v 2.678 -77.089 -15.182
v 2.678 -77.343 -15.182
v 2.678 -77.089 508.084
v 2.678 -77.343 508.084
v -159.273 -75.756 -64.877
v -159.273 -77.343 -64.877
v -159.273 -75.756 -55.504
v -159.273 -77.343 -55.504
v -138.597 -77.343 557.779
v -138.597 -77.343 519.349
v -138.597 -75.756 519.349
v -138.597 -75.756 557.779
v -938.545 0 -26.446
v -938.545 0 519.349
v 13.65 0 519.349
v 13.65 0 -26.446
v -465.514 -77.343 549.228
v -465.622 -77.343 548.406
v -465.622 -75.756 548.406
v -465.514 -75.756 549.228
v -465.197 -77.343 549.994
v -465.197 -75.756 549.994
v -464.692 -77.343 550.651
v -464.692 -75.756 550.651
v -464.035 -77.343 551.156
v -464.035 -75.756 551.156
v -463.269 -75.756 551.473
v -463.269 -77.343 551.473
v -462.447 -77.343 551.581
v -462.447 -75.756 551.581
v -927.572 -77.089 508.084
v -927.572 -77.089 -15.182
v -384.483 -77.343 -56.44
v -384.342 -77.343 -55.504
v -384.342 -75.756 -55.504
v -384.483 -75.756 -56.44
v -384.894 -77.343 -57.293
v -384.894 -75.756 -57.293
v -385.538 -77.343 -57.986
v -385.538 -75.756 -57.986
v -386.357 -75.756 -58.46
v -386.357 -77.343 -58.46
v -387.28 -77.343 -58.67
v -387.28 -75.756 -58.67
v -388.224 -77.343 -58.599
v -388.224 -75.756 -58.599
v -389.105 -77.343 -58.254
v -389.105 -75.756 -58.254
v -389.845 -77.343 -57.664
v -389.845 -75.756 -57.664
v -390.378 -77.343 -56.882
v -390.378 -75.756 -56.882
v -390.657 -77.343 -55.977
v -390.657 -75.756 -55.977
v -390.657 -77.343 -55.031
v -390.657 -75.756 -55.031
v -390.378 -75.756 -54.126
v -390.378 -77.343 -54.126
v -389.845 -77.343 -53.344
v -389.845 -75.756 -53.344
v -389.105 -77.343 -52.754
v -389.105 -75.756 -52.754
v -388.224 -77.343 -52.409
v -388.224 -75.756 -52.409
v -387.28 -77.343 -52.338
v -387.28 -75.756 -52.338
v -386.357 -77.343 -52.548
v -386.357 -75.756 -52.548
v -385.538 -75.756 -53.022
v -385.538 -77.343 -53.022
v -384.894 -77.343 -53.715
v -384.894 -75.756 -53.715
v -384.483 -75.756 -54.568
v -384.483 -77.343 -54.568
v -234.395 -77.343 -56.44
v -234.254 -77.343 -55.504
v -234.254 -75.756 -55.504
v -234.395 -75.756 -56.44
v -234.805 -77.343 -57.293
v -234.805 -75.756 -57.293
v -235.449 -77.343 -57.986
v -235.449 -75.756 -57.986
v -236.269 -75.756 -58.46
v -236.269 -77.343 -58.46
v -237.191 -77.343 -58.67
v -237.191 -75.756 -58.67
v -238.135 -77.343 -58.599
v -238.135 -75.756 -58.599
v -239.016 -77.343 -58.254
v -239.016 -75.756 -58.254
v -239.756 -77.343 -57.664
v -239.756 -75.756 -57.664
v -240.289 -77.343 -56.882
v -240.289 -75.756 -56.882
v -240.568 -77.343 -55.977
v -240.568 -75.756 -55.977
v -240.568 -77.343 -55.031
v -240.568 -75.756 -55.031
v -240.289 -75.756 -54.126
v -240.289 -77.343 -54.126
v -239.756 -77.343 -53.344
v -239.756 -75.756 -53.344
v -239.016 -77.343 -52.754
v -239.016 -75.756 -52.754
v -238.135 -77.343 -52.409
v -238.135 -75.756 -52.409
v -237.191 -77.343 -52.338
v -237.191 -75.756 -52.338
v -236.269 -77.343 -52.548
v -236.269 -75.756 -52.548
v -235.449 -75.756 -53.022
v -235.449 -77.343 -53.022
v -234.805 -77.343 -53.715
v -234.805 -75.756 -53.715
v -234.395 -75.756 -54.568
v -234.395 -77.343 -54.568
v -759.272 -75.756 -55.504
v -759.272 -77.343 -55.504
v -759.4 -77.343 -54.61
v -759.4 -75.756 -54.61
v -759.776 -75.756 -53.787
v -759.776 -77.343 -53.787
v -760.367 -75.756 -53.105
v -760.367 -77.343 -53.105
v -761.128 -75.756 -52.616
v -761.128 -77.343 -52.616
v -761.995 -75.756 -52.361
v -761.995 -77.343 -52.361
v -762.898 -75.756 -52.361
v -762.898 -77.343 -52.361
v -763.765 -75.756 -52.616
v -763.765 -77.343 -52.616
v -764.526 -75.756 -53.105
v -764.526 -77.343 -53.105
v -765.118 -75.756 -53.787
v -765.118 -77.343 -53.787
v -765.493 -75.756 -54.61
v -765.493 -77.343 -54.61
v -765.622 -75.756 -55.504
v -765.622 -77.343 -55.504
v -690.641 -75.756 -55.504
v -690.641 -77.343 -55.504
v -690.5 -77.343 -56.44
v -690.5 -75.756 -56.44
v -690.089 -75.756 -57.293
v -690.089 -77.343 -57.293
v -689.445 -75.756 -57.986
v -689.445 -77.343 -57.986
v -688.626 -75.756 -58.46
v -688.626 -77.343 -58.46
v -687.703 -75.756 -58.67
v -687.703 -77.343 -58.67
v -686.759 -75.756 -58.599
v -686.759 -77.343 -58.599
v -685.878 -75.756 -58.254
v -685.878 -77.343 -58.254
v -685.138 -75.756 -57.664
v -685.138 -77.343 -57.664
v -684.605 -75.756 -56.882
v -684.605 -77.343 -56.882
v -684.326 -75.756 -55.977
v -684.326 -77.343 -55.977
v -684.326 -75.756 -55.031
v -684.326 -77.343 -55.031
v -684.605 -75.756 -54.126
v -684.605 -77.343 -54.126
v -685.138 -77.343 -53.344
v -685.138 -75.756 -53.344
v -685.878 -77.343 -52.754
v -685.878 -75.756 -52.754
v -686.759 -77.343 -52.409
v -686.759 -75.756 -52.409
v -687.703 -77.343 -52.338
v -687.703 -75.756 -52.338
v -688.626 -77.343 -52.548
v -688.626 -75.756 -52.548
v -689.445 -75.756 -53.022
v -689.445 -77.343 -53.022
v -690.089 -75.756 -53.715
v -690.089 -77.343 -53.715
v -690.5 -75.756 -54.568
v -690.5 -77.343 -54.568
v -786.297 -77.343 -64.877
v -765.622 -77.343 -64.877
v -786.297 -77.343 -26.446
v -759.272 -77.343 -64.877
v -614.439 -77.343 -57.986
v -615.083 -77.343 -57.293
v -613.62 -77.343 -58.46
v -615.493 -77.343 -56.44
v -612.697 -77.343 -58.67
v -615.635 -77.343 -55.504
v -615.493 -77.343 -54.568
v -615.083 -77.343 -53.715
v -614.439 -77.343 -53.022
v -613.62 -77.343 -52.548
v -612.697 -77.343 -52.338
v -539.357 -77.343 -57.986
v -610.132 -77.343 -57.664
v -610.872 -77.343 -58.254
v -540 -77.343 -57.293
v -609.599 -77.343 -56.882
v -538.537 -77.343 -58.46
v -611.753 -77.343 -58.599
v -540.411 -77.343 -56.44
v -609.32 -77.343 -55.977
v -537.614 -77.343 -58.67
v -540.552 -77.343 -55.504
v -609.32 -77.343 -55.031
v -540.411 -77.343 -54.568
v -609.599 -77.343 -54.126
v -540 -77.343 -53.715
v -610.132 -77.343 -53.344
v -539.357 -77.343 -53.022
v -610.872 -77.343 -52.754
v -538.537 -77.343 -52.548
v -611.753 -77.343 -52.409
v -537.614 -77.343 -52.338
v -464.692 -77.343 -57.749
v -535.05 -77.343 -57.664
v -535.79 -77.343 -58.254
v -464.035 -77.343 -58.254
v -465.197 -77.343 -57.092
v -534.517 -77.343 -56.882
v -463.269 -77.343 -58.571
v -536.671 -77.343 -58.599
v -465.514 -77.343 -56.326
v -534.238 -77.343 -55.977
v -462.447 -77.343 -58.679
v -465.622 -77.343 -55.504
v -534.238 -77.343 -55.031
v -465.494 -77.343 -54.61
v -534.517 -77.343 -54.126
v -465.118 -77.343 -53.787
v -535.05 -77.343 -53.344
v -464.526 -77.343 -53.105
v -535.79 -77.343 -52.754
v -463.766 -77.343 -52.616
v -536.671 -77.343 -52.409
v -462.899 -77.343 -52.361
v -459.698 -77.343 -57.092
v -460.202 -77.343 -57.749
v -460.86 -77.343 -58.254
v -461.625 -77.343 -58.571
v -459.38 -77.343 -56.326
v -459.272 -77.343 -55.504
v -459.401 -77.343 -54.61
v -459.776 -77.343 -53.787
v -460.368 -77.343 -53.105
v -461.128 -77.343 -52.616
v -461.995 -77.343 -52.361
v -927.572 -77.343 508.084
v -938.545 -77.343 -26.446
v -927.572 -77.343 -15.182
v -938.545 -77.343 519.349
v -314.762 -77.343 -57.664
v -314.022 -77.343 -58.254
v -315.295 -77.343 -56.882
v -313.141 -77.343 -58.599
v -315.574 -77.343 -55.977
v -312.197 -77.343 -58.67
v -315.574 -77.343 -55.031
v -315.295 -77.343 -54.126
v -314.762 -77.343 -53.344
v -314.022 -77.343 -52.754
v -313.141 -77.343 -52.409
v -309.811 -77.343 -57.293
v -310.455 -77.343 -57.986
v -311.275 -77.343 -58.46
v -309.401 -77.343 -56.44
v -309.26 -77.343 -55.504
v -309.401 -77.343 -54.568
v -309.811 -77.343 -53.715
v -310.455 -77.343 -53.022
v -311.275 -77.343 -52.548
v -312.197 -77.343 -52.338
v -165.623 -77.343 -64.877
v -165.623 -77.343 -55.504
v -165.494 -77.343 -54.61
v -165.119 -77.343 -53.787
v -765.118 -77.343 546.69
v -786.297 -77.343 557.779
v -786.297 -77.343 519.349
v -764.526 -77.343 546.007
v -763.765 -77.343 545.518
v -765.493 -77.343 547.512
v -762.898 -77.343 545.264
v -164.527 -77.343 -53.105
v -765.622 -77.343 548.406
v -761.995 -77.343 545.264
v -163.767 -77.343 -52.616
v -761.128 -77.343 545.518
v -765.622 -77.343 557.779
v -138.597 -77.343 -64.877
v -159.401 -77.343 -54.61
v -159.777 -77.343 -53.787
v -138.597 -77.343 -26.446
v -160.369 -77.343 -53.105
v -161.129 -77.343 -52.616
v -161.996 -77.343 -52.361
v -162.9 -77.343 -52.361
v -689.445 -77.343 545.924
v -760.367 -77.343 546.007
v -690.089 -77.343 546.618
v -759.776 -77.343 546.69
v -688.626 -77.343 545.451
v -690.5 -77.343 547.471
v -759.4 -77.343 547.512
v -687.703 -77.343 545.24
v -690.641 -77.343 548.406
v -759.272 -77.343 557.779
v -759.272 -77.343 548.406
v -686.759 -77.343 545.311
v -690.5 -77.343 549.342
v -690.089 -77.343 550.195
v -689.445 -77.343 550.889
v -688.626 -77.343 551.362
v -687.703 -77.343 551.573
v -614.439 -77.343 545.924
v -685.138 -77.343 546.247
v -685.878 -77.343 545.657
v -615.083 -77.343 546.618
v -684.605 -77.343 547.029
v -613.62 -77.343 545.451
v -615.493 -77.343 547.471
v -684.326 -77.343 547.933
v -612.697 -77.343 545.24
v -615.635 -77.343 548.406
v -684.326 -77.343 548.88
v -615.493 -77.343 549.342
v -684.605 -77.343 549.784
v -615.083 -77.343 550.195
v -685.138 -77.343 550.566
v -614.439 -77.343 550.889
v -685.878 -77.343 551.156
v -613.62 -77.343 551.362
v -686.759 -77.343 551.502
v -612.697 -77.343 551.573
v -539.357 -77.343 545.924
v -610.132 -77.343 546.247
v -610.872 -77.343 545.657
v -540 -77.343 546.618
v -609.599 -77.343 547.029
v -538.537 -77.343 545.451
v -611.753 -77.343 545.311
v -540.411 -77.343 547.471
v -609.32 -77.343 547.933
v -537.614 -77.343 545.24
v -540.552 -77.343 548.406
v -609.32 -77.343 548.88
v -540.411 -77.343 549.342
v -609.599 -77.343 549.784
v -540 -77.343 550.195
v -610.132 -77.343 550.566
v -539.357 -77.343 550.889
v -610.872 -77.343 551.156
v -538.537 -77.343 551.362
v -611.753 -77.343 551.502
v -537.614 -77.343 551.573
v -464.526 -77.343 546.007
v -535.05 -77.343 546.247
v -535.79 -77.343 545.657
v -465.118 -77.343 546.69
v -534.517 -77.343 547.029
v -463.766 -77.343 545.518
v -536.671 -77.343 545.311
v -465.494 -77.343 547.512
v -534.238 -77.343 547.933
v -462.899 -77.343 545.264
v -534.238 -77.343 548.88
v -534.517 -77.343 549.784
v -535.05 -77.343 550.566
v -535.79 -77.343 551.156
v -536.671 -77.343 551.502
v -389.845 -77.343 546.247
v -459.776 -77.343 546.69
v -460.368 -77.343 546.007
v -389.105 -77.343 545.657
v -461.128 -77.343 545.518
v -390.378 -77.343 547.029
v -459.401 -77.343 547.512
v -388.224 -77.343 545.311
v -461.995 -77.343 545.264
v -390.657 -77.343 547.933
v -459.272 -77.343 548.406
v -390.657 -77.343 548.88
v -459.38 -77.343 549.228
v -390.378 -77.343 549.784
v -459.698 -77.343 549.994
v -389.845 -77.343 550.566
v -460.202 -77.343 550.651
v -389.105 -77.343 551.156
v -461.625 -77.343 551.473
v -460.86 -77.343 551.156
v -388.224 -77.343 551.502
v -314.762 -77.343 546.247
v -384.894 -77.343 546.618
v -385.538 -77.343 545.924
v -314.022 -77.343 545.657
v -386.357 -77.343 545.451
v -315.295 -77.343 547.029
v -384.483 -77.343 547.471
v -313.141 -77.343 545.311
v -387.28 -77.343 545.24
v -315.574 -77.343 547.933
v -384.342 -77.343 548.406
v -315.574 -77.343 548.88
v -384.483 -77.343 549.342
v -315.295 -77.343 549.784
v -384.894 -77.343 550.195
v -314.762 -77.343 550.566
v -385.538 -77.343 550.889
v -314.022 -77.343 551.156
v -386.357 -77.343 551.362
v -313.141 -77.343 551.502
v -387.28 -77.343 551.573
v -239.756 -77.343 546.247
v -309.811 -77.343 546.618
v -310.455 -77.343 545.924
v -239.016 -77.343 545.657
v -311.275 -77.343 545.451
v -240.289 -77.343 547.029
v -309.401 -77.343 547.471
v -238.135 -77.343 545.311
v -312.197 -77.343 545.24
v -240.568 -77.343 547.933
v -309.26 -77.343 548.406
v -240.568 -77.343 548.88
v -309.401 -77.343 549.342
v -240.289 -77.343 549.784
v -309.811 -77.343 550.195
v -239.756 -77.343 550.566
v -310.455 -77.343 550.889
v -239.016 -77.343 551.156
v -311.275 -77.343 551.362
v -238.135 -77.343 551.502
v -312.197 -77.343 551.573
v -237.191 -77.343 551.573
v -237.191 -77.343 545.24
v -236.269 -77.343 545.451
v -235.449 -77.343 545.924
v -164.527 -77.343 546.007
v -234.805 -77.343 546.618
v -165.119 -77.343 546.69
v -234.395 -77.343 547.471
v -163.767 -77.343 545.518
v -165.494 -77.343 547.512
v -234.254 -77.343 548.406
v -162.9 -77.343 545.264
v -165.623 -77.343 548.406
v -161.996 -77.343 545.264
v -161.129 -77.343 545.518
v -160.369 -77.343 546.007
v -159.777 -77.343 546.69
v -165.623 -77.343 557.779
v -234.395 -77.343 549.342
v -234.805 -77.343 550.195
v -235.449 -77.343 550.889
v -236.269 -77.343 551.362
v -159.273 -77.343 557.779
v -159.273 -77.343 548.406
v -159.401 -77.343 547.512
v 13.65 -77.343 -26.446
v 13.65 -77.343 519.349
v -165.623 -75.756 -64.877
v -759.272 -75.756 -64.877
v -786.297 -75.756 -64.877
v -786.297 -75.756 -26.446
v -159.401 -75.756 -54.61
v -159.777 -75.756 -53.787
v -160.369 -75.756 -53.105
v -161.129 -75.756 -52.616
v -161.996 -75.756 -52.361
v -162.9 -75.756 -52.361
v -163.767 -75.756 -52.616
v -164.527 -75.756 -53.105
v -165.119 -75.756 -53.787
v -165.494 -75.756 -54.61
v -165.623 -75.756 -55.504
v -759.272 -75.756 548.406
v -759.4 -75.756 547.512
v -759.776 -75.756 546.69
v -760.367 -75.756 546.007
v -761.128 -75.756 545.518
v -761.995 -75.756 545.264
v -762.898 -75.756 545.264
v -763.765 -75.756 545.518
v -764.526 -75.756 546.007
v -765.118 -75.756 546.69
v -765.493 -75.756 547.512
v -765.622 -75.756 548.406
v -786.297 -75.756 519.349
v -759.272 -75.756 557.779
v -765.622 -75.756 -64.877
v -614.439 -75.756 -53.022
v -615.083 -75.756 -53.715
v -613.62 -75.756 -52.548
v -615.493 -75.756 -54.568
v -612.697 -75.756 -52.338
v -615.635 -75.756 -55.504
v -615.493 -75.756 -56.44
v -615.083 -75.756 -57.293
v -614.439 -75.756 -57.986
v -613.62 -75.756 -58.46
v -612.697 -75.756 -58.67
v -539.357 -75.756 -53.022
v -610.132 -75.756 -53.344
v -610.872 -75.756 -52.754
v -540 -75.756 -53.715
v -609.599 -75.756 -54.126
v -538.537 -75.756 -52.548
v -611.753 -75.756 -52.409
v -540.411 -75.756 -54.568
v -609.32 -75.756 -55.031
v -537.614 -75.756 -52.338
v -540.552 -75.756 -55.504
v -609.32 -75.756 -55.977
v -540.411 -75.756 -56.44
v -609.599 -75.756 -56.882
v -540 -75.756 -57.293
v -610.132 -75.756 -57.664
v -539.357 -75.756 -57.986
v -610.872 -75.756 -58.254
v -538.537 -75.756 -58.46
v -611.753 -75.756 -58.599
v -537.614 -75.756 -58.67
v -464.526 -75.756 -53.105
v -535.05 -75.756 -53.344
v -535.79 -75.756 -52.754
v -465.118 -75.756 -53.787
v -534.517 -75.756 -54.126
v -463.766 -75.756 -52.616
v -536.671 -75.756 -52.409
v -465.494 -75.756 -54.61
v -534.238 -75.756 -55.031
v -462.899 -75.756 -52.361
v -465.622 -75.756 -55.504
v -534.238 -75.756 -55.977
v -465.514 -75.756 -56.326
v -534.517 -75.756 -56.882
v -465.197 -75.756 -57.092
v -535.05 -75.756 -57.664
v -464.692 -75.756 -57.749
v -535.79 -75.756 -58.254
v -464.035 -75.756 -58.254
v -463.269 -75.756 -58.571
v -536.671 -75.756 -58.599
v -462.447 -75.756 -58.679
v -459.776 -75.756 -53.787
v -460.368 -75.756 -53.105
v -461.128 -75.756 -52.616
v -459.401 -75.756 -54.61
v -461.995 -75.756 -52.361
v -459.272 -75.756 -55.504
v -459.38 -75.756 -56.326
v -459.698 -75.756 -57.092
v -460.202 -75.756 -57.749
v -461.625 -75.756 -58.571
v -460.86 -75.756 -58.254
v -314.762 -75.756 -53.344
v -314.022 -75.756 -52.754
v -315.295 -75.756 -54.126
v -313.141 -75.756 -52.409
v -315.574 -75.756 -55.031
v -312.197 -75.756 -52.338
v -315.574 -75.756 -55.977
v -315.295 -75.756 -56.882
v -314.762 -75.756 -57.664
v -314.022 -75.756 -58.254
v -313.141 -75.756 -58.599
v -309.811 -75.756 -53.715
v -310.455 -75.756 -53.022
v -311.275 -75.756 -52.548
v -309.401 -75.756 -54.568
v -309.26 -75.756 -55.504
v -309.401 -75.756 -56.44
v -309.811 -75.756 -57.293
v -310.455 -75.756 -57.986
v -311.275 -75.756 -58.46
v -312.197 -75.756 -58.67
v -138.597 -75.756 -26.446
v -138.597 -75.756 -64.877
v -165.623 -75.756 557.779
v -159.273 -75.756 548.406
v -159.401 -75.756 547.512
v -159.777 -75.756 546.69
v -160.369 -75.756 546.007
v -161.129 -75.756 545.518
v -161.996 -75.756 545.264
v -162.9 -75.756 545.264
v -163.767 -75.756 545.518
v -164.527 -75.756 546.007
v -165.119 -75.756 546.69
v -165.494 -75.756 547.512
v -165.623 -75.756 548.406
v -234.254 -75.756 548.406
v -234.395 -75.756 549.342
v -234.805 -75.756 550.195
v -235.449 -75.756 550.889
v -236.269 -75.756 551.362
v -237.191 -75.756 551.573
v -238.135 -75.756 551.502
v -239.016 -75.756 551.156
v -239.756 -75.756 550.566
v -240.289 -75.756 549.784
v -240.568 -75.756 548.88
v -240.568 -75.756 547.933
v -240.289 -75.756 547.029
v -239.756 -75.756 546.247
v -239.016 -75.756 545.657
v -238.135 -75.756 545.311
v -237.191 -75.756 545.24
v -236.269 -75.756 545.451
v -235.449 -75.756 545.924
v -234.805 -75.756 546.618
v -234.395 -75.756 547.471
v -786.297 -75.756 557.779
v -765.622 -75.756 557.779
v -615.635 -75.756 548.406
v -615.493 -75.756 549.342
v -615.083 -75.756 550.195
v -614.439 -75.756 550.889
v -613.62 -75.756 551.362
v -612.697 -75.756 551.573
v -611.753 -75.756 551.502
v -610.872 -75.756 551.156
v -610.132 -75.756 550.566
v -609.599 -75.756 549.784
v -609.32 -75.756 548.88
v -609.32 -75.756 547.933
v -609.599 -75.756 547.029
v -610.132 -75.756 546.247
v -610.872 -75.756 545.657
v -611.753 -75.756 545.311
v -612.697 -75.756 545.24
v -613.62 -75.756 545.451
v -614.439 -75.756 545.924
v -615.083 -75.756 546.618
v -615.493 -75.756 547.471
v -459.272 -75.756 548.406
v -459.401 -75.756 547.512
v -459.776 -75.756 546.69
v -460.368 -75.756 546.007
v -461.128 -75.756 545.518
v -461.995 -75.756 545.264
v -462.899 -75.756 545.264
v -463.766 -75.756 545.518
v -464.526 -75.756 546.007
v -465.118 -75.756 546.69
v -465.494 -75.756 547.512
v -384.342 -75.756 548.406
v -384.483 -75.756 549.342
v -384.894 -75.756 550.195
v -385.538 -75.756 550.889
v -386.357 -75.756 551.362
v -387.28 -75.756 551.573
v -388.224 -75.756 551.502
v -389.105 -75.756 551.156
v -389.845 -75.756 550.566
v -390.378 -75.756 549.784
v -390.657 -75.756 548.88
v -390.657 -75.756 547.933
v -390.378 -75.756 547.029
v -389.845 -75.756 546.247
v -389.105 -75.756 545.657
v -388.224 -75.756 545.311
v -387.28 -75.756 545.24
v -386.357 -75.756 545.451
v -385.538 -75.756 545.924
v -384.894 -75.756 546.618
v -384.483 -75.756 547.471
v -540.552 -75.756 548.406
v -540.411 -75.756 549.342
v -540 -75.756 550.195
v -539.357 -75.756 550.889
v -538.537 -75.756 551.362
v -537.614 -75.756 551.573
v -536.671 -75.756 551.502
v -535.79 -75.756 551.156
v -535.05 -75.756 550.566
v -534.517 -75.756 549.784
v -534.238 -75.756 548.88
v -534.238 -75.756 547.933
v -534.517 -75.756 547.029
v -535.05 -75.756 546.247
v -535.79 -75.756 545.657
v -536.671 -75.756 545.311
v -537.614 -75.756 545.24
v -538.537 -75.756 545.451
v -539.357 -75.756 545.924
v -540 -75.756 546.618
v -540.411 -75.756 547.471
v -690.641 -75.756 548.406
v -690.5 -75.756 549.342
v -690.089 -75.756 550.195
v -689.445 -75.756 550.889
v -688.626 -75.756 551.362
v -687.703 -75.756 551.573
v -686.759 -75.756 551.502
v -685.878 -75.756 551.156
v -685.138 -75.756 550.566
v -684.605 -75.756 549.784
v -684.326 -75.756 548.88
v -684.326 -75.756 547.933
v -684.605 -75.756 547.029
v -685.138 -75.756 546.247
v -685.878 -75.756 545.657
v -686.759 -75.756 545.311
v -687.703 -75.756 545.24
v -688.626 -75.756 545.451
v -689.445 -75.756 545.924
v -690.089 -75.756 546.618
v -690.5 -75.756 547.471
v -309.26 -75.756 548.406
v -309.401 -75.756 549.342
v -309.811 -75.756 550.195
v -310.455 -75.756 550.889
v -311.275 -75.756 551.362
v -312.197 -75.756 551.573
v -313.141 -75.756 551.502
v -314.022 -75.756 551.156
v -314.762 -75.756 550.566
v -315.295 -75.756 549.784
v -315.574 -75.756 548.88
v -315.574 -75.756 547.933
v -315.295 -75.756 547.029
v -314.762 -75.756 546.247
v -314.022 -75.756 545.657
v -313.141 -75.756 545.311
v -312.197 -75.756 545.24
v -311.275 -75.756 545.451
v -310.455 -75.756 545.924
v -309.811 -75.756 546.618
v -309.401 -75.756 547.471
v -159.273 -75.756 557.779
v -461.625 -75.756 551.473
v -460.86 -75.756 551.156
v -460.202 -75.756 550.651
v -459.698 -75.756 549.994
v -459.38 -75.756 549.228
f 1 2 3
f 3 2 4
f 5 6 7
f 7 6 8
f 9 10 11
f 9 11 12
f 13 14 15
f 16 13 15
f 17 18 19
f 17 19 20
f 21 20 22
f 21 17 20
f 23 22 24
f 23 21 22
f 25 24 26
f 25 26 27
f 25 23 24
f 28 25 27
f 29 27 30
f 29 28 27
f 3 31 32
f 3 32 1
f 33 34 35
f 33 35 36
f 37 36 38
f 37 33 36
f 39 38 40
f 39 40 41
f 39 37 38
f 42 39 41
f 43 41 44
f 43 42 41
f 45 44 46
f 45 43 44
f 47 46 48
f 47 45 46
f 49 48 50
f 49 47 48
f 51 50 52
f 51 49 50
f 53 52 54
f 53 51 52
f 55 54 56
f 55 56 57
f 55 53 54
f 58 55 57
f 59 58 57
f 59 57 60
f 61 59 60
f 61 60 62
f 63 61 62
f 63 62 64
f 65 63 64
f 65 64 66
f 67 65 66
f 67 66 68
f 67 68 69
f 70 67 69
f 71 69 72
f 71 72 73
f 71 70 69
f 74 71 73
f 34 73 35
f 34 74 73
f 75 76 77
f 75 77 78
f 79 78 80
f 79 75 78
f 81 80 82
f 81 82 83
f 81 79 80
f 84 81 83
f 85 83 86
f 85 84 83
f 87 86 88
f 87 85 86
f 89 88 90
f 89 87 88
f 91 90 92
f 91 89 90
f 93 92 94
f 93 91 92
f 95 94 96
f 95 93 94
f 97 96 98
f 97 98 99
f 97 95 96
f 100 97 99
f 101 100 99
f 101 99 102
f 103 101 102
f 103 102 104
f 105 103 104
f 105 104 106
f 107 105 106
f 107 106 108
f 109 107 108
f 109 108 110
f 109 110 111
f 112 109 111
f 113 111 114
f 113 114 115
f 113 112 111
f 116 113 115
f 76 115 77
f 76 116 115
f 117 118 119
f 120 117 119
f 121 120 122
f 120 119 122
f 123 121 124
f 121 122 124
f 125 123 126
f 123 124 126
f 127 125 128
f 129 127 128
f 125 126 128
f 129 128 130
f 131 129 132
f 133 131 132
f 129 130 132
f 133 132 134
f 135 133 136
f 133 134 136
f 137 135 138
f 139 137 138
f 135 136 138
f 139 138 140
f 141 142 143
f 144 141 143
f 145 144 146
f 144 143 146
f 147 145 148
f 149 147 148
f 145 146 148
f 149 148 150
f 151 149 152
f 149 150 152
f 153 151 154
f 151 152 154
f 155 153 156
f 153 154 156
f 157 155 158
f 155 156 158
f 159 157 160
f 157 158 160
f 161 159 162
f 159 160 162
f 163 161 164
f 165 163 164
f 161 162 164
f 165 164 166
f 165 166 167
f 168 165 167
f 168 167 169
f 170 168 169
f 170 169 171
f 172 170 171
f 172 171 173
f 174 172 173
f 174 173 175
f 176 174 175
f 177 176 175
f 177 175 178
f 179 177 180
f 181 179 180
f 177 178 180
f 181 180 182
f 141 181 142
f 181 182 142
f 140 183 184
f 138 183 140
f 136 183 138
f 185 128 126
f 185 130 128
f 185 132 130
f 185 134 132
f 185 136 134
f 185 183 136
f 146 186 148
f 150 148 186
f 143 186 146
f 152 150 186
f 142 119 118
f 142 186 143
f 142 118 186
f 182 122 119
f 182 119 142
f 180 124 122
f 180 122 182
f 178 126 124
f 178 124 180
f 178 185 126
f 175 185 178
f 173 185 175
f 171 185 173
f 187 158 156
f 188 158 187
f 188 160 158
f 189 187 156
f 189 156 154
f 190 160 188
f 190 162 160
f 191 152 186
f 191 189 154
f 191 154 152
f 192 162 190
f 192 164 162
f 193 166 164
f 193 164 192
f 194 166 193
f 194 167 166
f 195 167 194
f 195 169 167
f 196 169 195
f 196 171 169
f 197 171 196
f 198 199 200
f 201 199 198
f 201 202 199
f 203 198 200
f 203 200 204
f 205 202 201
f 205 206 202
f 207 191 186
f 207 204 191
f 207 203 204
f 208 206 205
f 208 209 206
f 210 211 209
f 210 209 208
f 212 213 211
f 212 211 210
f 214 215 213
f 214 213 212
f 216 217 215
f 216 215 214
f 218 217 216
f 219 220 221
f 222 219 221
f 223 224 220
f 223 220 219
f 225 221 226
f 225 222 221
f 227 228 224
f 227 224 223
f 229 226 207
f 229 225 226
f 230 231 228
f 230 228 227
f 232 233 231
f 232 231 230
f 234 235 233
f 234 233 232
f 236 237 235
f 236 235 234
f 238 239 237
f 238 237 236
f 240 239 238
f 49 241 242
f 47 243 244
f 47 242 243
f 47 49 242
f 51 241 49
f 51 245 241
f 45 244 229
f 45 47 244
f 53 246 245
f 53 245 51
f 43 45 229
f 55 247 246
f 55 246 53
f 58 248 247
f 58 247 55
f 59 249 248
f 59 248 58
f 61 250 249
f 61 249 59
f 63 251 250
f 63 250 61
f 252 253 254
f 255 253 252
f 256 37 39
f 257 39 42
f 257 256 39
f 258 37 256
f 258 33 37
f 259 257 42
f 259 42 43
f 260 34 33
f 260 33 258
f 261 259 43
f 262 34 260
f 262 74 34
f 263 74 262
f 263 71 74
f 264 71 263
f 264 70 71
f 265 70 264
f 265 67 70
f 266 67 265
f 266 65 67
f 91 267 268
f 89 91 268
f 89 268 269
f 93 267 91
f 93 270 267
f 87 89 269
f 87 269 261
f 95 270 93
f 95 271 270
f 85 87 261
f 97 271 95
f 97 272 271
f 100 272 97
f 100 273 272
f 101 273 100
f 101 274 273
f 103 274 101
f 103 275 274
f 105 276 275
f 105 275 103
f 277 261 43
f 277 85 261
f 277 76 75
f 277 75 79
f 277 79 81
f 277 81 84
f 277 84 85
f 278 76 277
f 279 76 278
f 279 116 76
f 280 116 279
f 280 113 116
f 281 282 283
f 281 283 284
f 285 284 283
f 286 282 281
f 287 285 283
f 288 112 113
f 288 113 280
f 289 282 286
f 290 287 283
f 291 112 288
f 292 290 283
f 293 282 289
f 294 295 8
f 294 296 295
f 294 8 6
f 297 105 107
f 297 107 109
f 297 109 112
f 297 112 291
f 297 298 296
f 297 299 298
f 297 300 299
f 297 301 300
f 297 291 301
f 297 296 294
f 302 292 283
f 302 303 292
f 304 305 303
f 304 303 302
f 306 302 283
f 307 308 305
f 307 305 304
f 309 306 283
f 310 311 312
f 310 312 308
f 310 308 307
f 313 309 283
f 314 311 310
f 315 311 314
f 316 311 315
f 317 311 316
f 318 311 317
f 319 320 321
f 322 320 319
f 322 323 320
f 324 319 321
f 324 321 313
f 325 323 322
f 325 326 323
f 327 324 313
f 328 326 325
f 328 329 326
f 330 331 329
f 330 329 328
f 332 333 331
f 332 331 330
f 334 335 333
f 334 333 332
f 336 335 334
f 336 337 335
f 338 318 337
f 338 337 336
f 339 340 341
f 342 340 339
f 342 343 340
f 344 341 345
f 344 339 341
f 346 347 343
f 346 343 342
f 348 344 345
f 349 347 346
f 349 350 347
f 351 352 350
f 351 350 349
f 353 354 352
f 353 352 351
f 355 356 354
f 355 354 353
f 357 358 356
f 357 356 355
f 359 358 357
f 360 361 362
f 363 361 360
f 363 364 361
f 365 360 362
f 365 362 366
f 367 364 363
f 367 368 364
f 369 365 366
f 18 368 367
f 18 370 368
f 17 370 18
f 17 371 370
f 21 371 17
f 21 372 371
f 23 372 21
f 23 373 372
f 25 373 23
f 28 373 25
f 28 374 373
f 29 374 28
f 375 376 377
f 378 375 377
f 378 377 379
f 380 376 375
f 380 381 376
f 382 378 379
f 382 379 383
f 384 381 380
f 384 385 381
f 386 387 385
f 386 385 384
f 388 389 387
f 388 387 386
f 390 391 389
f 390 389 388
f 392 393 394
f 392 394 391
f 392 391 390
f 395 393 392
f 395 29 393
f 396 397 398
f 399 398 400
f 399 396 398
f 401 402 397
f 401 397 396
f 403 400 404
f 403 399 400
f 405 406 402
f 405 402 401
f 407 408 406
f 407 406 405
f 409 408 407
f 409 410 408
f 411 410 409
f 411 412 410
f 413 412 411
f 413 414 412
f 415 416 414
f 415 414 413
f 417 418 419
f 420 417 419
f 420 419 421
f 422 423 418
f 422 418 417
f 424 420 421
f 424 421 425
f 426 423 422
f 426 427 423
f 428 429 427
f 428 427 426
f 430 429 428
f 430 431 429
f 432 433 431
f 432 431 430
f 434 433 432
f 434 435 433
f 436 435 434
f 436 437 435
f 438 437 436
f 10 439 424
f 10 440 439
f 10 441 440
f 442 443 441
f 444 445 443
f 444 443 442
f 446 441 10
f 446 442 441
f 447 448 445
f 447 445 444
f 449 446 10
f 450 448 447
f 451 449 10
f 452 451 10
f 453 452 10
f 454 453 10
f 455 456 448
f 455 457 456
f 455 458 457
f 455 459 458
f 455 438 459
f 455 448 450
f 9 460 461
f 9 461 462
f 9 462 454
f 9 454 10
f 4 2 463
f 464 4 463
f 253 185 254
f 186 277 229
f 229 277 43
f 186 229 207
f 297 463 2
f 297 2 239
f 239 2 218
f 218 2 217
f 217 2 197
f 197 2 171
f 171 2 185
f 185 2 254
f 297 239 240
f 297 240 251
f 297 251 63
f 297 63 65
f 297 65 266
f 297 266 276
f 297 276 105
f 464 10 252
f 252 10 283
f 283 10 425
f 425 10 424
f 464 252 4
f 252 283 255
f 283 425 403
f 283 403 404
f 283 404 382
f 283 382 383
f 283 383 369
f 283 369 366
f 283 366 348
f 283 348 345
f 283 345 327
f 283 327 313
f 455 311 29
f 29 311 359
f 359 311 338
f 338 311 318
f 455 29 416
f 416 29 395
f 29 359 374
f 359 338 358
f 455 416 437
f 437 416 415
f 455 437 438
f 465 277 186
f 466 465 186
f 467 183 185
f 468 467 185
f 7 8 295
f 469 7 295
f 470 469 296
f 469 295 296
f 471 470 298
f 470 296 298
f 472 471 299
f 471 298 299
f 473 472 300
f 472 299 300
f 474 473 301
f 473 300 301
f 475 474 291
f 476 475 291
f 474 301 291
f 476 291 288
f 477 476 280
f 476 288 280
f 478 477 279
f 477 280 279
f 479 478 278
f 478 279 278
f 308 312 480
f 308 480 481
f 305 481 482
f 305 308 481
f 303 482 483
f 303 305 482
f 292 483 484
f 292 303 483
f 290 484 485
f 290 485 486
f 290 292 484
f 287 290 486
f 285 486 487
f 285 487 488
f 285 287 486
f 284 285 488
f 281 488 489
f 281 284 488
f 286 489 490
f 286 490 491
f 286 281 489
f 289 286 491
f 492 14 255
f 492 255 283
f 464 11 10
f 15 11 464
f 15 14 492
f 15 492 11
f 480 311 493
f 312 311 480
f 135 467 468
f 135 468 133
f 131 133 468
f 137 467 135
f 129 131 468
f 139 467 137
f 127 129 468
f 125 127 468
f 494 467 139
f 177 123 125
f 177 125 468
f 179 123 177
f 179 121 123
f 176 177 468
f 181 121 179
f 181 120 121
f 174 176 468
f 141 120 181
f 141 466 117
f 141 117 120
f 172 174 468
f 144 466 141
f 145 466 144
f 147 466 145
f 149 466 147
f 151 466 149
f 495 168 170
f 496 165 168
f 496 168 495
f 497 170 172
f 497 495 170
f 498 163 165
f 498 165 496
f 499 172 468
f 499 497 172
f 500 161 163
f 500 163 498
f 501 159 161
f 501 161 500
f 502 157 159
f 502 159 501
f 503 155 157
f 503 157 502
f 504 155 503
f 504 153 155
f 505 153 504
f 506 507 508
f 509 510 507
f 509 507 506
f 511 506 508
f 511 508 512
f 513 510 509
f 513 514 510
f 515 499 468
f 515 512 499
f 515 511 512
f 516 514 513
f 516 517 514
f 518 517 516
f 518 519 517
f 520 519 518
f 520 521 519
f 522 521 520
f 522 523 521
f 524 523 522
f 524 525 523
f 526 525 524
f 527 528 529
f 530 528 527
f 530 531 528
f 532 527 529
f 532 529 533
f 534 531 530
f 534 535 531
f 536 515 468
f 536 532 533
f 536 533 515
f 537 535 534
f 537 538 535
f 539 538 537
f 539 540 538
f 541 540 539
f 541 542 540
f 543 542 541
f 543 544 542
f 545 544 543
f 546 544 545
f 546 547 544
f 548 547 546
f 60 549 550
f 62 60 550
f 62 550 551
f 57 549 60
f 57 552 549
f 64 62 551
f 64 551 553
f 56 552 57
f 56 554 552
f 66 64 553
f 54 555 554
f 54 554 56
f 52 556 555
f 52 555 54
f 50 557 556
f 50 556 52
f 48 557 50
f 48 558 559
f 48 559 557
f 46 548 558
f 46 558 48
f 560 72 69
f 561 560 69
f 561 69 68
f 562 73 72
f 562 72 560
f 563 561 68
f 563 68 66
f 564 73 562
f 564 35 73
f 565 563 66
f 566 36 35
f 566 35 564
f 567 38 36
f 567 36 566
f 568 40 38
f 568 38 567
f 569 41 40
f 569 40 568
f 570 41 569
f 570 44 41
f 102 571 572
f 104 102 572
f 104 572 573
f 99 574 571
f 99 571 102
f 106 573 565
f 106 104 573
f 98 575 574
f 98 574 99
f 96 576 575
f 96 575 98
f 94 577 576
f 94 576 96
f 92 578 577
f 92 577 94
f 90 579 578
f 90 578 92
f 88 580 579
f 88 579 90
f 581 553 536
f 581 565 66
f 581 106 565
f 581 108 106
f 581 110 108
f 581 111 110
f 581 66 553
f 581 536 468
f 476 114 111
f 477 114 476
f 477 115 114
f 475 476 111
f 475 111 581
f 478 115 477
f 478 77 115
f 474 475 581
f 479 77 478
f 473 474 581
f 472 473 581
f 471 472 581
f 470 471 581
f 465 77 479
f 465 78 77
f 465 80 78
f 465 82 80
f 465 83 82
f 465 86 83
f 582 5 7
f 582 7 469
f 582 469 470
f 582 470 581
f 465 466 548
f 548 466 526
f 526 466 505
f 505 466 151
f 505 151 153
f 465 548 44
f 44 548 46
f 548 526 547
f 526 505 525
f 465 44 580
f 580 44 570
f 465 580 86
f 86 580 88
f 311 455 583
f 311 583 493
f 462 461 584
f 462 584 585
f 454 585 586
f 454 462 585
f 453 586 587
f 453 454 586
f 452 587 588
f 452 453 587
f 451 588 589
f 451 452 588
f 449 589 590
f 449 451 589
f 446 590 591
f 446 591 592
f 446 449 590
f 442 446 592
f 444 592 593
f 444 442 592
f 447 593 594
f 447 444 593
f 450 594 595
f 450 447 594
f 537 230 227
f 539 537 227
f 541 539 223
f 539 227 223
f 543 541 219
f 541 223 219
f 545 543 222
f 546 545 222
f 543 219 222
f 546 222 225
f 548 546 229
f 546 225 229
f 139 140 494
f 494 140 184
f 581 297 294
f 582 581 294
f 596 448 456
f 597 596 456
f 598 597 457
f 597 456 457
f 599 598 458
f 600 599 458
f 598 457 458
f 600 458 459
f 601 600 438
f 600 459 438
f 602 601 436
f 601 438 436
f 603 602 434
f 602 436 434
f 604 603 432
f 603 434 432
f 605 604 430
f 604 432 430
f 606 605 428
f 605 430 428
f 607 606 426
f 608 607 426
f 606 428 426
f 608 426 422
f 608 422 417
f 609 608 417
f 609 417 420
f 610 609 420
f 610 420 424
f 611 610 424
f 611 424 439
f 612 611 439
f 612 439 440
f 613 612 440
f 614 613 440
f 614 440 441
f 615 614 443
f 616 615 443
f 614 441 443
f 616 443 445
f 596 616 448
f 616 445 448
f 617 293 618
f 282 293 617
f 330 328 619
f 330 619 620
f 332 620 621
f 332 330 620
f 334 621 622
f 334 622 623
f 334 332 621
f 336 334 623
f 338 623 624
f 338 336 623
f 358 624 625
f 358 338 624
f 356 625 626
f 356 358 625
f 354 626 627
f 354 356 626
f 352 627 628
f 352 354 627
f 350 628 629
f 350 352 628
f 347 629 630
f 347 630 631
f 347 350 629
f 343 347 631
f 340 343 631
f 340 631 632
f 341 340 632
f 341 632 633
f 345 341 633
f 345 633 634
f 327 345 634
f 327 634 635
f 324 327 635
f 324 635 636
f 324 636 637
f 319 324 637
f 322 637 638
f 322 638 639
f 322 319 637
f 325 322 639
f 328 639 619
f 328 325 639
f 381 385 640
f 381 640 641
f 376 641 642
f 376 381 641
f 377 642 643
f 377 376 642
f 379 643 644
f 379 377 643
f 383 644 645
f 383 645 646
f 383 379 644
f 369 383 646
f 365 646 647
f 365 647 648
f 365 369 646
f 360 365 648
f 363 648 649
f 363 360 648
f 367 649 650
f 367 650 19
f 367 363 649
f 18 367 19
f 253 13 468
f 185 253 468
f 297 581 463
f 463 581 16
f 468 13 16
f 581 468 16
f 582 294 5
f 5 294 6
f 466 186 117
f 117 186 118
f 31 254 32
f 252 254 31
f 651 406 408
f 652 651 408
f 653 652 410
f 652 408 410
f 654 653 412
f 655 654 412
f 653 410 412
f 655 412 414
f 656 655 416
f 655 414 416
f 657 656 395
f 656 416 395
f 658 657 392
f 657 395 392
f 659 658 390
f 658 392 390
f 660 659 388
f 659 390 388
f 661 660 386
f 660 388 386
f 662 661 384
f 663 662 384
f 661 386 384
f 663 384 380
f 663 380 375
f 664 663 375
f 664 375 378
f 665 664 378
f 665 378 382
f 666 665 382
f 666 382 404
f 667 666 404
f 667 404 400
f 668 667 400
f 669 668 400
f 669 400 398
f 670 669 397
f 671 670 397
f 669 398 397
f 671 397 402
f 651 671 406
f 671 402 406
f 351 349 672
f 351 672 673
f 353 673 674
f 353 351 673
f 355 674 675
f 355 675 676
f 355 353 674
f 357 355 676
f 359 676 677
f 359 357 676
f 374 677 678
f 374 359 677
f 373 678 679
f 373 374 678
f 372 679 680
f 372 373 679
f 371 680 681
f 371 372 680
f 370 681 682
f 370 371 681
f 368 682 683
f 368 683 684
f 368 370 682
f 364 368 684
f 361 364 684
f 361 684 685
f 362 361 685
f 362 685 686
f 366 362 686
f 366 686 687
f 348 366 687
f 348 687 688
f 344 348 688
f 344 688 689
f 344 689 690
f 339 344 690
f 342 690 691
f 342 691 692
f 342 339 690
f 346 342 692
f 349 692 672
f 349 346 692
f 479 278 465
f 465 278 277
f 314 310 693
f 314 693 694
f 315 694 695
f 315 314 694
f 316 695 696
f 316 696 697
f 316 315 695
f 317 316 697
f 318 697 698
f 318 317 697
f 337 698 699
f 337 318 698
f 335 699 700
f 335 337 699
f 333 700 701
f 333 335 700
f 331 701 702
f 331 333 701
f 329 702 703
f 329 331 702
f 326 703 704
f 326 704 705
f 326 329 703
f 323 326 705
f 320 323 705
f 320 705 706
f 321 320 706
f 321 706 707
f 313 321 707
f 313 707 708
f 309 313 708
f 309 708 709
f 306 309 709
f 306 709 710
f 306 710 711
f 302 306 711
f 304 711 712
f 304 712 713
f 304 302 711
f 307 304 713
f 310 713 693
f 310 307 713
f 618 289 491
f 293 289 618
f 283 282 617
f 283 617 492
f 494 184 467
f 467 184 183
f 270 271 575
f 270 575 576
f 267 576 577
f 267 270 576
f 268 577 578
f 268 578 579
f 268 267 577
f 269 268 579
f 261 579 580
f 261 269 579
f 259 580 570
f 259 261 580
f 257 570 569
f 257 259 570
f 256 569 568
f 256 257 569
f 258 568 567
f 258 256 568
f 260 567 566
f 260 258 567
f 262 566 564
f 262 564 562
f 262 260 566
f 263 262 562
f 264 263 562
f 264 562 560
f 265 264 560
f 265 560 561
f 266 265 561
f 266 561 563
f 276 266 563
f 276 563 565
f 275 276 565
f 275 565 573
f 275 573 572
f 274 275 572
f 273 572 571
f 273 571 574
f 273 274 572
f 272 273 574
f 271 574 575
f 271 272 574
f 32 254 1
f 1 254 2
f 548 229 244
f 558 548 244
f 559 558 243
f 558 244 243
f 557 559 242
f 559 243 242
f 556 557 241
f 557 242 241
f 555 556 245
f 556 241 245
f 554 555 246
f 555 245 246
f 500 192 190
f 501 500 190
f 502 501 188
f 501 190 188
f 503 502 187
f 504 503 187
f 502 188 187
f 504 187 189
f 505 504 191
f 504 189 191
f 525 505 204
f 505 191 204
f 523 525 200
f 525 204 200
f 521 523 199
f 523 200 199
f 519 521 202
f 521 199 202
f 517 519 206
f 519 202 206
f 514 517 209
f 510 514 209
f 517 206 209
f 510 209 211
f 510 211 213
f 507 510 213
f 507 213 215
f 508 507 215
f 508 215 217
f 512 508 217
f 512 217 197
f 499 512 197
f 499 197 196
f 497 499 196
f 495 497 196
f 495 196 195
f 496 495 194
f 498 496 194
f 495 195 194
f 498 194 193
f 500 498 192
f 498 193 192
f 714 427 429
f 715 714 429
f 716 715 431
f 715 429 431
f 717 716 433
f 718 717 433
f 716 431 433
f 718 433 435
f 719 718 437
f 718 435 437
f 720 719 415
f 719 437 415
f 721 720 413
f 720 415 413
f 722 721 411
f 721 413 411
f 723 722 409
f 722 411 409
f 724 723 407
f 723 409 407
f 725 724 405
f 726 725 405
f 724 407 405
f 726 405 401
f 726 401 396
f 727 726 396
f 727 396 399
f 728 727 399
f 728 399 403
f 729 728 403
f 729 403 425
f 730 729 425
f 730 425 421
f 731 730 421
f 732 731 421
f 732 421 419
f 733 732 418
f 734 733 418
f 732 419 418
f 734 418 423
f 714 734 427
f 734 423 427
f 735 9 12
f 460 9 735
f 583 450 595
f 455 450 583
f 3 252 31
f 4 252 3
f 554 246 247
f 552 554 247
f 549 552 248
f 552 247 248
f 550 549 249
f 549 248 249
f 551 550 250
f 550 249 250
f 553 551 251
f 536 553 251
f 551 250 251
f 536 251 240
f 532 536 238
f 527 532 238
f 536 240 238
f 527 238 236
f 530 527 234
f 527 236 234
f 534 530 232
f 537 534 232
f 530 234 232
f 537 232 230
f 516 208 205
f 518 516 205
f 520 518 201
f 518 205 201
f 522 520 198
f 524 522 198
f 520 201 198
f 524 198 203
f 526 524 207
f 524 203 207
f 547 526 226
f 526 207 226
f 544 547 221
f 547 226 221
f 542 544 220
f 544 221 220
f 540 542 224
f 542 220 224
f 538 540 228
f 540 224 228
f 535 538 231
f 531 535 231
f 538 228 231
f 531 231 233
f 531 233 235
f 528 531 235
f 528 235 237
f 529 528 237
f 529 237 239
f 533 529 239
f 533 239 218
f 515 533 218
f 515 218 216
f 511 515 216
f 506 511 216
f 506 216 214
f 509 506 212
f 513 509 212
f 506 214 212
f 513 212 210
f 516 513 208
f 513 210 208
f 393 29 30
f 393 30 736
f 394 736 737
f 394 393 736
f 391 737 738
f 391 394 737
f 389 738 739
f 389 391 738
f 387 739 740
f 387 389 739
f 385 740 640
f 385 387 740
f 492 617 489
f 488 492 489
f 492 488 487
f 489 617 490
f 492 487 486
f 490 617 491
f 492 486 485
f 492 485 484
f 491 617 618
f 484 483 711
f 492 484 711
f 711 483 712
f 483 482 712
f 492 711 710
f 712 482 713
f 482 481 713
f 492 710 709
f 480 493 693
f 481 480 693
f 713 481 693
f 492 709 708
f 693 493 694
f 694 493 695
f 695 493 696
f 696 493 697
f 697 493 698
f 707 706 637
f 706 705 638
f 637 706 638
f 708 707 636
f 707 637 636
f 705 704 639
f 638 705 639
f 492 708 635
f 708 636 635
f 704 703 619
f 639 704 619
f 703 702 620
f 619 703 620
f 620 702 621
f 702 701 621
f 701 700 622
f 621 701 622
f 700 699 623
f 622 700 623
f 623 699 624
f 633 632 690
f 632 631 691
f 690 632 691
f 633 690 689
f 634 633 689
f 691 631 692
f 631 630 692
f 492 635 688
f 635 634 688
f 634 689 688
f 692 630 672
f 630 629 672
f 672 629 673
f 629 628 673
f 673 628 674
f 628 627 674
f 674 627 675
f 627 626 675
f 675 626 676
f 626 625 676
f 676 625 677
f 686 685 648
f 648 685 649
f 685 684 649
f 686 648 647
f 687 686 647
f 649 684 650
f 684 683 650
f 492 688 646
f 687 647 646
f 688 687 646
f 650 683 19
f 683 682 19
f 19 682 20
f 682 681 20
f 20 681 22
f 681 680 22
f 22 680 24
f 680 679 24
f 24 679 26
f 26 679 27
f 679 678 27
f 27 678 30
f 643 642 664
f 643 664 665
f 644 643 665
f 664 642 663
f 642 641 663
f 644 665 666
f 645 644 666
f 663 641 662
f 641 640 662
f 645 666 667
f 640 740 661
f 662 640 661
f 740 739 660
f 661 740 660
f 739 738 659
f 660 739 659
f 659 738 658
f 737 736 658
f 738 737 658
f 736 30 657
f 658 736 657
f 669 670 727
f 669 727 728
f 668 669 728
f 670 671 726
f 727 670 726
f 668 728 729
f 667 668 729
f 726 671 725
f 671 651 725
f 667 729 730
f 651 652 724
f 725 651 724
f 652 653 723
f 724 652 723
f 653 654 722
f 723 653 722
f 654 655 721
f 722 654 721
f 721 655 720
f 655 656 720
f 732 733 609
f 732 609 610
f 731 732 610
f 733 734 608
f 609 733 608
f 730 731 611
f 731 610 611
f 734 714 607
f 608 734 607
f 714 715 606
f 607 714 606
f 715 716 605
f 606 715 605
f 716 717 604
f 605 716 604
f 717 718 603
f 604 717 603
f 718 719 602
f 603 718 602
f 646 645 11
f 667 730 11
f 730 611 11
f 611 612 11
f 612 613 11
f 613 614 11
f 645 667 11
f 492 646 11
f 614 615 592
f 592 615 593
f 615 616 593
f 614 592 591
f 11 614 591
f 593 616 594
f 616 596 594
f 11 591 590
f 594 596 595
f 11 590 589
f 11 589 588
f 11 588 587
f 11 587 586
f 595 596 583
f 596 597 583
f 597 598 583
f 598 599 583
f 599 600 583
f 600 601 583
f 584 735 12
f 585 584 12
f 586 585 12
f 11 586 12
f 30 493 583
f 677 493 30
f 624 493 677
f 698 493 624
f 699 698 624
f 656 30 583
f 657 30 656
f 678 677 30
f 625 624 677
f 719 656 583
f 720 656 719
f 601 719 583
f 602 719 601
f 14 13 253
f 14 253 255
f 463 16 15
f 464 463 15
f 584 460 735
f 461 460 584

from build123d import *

# Parameters (mm, degrees)
F0_W     = 952.1952
F0_H     = 545.7952
F1_DEPTH = 77.343
F2_R     = 3.175
F3_DEPTH = 1.5875
F6_W     = 930.2496
F6_H     = 523.2654
F7_DEPTH = 0.254


with BuildPart() as f1:
    # F0 (on Front) → F1 (new body)
    with BuildSketch(Plane.XZ):
        with Locations((-462.4471531919, 246.4511793006)):
            Rectangle(F0_W, F0_H)
    extrude(amount=F1_DEPTH)

    # F2 (on face) → F3 (join)
    with BuildSketch(Plane.XZ.offset(77.343)):
        with BuildLine():
            Line((-765.6215531919, 557.7789793006), (-786.2971531919, 557.7789793006))
            Line((-786.2971531919, 557.7789793006), (-786.2971531919, 519.3487793006))
            Line((-786.2971531919, 519.3487793006), (-138.5971531919, 519.3487793006))
            Line((-138.5971531919, 519.3487793006), (-138.5971531919, 557.7789793006))
            Line((-138.5971531919, 557.7789793006), (-159.2727531919, 557.7789793006))
            Line((-159.2727531919, 557.7789793006), (-159.2727531919, 548.4063793006))
            ThreePointArc((-159.2727531919, 548.4063793006), (-162.4477531919, 545.2313793006), (-165.6227531919, 548.4063793006))
            Line((-165.6227531919, 548.4063793006), (-165.6227531919, 557.7789793006))
            Line((-165.6227531919, 557.7789793006), (-462.4471531919, 557.7789793006))
            Line((-462.4471531919, 557.7789793006), (-462.4471531919, 551.5813793006))
            ThreePointArc((-462.4471531919, 551.5813793006), (-460.2020891616, 550.6514433309), (-459.2721531919, 548.4063793006))
            ThreePointArc((-459.2721531919, 548.4063793006), (-462.4471531919, 545.2313793006), (-465.6221531919, 548.4063793006))
            Line((-465.6221531919, 548.4063793006), (-534.2021531919, 548.4063793006))
            ThreePointArc((-534.2021531919, 548.4063793006), (-537.3771531919, 545.2313793006), (-540.5521531919, 548.4063793006))
            Line((-540.5521531919, 548.4063793006), (-609.2845531919, 548.4063793006))
            ThreePointArc((-609.2845531919, 548.4063793006), (-612.4595531919, 545.2313793006), (-615.6345531919, 548.4063793006))
            Line((-615.6345531919, 548.4063793006), (-684.2907531919, 548.4063793006))
            ThreePointArc((-684.2907531919, 548.4063793006), (-687.4657531919, 545.2313793006), (-690.6407531919, 548.4063793006))
            Line((-690.6407531919, 548.4063793006), (-759.2715531919, 548.4063793006))
            ThreePointArc((-759.2715531919, 548.4063793006), (-762.4465531919, 545.2313793006), (-765.6215531919, 548.4063793006))
            Line((-765.6215531919, 548.4063793006), (-765.6215531919, 557.7789793006))
        make_face()
        with Locations((-387.5171531919, 548.4063793006)):
            Circle(F2_R, mode=Mode.SUBTRACT)
        with Locations((-312.4347531919, 548.4063793006)):
            Circle(F2_R, mode=Mode.SUBTRACT)
        with Locations((-237.4285531919, 548.4063793006)):
            Circle(F2_R, mode=Mode.SUBTRACT)
        with BuildLine():
            Line((-462.4471531919, 557.7789793006), (-759.2715531919, 557.7789793006))
            Line((-759.2715531919, 557.7789793006), (-759.2715531919, 548.4063793006))
            Line((-759.2715531919, 548.4063793006), (-690.6407531919, 548.4063793006))
            ThreePointArc((-690.6407531919, 548.4063793006), (-687.4657531919, 551.5813793006), (-684.2907531919, 548.4063793006))
            Line((-684.2907531919, 548.4063793006), (-615.6345531919, 548.4063793006))
            ThreePointArc((-615.6345531919, 548.4063793006), (-612.4595531919, 551.5813793006), (-609.2845531919, 548.4063793006))
            Line((-609.2845531919, 548.4063793006), (-540.5521531919, 548.4063793006))
            ThreePointArc((-540.5521531919, 548.4063793006), (-537.3771531919, 551.5813793006), (-534.2021531919, 548.4063793006))
            Line((-534.2021531919, 548.4063793006), (-465.6221531919, 548.4063793006))
            ThreePointArc((-465.6221531919, 548.4063793006), (-464.6922172221, 550.6514433309), (-462.4471531919, 551.5813793006))
            Line((-462.4471531919, 551.5813793006), (-462.4471531919, 557.7789793006))
        make_face()
    extrude(amount=-F3_DEPTH)

    # F5: F1 across plane


with BuildPart() as f1_1:
    add(f1.part)
    add(f1.part.mirror(Plane(origin=(-462.4471531919, -38.6715, 246.4511793006), x_dir=(1, 0, 0), z_dir=(0, 0, -1))))

    # F6 (on face) → F7 (cut)
    with BuildSketch(Plane.XZ.offset(77.343)):
        with Locations((-462.4471531919, 246.4511793006)):
            Rectangle(F6_W, F6_H)
    extrude(amount=-F7_DEPTH, mode=Mode.SUBTRACT)


solid = f1_1.part
